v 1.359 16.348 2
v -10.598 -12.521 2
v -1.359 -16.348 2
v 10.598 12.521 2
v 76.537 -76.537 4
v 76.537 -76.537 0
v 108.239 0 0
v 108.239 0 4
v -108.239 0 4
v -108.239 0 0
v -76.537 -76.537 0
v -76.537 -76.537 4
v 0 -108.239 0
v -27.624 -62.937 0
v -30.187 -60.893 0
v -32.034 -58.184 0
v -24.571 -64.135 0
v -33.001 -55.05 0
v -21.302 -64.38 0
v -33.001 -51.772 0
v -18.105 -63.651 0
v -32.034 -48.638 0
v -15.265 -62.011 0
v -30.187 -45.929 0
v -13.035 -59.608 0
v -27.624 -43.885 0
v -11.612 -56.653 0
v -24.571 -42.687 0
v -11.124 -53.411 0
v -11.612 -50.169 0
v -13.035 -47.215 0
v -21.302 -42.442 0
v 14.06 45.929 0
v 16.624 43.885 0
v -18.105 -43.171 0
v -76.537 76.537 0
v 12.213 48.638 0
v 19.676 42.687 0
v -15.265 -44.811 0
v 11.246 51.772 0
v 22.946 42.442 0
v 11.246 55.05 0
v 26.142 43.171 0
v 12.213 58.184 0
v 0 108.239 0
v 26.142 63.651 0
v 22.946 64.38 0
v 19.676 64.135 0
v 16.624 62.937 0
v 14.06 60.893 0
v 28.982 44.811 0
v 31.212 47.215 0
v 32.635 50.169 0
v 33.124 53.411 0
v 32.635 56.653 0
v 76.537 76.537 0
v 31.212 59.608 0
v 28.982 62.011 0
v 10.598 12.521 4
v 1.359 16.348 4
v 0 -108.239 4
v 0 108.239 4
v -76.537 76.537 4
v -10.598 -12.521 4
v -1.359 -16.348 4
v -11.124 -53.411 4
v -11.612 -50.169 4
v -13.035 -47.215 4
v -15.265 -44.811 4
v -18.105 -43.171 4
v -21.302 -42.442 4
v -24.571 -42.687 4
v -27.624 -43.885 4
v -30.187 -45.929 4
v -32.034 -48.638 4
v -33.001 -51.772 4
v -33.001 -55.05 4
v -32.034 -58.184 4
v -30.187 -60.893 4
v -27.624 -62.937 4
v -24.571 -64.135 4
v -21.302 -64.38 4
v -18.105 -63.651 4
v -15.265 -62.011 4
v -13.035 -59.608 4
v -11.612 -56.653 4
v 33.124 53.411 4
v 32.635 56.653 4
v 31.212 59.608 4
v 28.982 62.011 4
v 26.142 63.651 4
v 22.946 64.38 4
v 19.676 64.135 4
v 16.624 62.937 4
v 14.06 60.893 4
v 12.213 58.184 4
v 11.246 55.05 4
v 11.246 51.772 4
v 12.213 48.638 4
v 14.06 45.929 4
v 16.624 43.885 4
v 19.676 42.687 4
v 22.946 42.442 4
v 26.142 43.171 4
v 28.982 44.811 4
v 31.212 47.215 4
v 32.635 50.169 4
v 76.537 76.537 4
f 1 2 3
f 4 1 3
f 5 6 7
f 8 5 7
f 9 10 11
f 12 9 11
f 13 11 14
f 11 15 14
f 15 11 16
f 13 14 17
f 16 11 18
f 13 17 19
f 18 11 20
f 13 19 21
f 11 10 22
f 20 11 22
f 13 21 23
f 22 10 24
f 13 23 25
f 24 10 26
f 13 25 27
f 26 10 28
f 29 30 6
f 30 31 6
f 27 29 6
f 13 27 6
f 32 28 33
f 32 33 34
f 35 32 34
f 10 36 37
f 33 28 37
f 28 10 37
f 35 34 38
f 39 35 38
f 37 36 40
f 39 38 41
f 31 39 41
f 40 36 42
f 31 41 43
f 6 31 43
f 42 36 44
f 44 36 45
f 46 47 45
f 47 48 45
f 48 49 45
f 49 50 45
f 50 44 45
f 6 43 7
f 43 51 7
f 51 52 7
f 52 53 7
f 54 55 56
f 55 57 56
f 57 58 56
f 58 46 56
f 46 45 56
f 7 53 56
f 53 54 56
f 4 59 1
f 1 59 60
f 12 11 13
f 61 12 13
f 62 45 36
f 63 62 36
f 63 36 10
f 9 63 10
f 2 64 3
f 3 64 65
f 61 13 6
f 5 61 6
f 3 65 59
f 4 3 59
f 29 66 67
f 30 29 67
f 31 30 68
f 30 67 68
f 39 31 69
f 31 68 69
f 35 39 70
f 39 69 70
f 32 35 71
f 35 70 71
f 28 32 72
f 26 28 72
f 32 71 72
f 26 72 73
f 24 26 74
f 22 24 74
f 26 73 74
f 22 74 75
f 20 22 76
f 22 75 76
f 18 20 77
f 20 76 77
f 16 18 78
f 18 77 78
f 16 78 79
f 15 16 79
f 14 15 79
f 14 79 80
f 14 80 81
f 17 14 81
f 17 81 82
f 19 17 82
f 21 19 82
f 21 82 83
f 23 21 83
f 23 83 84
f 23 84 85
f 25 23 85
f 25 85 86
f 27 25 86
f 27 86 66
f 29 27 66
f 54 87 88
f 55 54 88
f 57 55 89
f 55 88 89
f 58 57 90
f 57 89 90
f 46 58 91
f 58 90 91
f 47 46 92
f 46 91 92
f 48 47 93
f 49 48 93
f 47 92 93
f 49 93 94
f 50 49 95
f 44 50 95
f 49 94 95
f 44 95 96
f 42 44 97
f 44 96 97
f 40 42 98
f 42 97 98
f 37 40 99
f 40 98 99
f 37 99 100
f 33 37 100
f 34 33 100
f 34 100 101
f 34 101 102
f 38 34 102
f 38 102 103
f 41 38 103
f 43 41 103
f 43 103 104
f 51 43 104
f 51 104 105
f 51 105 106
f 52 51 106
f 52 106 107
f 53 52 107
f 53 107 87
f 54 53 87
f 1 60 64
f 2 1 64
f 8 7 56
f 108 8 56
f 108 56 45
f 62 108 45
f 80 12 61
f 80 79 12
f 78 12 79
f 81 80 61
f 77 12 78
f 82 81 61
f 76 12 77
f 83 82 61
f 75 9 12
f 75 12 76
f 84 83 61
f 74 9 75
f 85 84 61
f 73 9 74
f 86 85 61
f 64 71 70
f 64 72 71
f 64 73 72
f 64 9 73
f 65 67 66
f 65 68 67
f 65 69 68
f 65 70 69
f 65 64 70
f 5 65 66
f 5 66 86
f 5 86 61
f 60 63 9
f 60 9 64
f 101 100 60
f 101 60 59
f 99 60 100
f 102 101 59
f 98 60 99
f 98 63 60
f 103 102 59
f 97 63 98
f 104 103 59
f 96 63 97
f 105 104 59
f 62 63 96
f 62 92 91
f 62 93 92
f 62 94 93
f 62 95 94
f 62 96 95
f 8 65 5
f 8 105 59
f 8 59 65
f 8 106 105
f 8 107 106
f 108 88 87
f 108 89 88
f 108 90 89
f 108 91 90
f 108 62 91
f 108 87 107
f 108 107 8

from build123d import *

# Parameters (mm, degrees)
BOSS_EXTRUDE1_DEPTH = 4
CUT_EXTRUDE1_DEPTH  = 2
SKETCH3_R           = 11
CUT_EXTRUDE2_DEPTH  = 154.125626546


with BuildPart() as part:
    # Sketch1 → Boss-Extrude1 (new body)
    with BuildSketch(Plane.XY):
        Polygon((0, -108.239220029), (76.536686473, -76.536686473), (108.239220029, 0), (76.536686473, 76.536686473), (0, 108.239220029), (-76.536686473, 76.536686473), (-108.239220029, 0), (-76.536686473, -76.536686473), align=None)
    extrude(amount=BOSS_EXTRUDE1_DEPTH)

    # Sketch2 → Cut-Extrude1 (cut)
    with BuildSketch(Plane.XY.offset(4)):
        Polygon((-10.598200902, -12.520690706), (-1.359405577, -16.347525029), (10.598200902, 12.520690706), (1.359405577, 16.347525029), align=None)
    extrude(amount=-CUT_EXTRUDE1_DEPTH, mode=Mode.SUBTRACT)

    # Sketch3 → Cut-Extrude2 (cut, through all)
    with BuildSketch(Plane.XY.offset(4)):
        with Locations((-22.123573238, -53.411030559)):
            Circle(SKETCH3_R)
        with Locations((22.123573238, 53.411030559)):
            Circle(SKETCH3_R)
    extrude(amount=-CUT_EXTRUDE2_DEPTH, mode=Mode.SUBTRACT)


solid = part.part
